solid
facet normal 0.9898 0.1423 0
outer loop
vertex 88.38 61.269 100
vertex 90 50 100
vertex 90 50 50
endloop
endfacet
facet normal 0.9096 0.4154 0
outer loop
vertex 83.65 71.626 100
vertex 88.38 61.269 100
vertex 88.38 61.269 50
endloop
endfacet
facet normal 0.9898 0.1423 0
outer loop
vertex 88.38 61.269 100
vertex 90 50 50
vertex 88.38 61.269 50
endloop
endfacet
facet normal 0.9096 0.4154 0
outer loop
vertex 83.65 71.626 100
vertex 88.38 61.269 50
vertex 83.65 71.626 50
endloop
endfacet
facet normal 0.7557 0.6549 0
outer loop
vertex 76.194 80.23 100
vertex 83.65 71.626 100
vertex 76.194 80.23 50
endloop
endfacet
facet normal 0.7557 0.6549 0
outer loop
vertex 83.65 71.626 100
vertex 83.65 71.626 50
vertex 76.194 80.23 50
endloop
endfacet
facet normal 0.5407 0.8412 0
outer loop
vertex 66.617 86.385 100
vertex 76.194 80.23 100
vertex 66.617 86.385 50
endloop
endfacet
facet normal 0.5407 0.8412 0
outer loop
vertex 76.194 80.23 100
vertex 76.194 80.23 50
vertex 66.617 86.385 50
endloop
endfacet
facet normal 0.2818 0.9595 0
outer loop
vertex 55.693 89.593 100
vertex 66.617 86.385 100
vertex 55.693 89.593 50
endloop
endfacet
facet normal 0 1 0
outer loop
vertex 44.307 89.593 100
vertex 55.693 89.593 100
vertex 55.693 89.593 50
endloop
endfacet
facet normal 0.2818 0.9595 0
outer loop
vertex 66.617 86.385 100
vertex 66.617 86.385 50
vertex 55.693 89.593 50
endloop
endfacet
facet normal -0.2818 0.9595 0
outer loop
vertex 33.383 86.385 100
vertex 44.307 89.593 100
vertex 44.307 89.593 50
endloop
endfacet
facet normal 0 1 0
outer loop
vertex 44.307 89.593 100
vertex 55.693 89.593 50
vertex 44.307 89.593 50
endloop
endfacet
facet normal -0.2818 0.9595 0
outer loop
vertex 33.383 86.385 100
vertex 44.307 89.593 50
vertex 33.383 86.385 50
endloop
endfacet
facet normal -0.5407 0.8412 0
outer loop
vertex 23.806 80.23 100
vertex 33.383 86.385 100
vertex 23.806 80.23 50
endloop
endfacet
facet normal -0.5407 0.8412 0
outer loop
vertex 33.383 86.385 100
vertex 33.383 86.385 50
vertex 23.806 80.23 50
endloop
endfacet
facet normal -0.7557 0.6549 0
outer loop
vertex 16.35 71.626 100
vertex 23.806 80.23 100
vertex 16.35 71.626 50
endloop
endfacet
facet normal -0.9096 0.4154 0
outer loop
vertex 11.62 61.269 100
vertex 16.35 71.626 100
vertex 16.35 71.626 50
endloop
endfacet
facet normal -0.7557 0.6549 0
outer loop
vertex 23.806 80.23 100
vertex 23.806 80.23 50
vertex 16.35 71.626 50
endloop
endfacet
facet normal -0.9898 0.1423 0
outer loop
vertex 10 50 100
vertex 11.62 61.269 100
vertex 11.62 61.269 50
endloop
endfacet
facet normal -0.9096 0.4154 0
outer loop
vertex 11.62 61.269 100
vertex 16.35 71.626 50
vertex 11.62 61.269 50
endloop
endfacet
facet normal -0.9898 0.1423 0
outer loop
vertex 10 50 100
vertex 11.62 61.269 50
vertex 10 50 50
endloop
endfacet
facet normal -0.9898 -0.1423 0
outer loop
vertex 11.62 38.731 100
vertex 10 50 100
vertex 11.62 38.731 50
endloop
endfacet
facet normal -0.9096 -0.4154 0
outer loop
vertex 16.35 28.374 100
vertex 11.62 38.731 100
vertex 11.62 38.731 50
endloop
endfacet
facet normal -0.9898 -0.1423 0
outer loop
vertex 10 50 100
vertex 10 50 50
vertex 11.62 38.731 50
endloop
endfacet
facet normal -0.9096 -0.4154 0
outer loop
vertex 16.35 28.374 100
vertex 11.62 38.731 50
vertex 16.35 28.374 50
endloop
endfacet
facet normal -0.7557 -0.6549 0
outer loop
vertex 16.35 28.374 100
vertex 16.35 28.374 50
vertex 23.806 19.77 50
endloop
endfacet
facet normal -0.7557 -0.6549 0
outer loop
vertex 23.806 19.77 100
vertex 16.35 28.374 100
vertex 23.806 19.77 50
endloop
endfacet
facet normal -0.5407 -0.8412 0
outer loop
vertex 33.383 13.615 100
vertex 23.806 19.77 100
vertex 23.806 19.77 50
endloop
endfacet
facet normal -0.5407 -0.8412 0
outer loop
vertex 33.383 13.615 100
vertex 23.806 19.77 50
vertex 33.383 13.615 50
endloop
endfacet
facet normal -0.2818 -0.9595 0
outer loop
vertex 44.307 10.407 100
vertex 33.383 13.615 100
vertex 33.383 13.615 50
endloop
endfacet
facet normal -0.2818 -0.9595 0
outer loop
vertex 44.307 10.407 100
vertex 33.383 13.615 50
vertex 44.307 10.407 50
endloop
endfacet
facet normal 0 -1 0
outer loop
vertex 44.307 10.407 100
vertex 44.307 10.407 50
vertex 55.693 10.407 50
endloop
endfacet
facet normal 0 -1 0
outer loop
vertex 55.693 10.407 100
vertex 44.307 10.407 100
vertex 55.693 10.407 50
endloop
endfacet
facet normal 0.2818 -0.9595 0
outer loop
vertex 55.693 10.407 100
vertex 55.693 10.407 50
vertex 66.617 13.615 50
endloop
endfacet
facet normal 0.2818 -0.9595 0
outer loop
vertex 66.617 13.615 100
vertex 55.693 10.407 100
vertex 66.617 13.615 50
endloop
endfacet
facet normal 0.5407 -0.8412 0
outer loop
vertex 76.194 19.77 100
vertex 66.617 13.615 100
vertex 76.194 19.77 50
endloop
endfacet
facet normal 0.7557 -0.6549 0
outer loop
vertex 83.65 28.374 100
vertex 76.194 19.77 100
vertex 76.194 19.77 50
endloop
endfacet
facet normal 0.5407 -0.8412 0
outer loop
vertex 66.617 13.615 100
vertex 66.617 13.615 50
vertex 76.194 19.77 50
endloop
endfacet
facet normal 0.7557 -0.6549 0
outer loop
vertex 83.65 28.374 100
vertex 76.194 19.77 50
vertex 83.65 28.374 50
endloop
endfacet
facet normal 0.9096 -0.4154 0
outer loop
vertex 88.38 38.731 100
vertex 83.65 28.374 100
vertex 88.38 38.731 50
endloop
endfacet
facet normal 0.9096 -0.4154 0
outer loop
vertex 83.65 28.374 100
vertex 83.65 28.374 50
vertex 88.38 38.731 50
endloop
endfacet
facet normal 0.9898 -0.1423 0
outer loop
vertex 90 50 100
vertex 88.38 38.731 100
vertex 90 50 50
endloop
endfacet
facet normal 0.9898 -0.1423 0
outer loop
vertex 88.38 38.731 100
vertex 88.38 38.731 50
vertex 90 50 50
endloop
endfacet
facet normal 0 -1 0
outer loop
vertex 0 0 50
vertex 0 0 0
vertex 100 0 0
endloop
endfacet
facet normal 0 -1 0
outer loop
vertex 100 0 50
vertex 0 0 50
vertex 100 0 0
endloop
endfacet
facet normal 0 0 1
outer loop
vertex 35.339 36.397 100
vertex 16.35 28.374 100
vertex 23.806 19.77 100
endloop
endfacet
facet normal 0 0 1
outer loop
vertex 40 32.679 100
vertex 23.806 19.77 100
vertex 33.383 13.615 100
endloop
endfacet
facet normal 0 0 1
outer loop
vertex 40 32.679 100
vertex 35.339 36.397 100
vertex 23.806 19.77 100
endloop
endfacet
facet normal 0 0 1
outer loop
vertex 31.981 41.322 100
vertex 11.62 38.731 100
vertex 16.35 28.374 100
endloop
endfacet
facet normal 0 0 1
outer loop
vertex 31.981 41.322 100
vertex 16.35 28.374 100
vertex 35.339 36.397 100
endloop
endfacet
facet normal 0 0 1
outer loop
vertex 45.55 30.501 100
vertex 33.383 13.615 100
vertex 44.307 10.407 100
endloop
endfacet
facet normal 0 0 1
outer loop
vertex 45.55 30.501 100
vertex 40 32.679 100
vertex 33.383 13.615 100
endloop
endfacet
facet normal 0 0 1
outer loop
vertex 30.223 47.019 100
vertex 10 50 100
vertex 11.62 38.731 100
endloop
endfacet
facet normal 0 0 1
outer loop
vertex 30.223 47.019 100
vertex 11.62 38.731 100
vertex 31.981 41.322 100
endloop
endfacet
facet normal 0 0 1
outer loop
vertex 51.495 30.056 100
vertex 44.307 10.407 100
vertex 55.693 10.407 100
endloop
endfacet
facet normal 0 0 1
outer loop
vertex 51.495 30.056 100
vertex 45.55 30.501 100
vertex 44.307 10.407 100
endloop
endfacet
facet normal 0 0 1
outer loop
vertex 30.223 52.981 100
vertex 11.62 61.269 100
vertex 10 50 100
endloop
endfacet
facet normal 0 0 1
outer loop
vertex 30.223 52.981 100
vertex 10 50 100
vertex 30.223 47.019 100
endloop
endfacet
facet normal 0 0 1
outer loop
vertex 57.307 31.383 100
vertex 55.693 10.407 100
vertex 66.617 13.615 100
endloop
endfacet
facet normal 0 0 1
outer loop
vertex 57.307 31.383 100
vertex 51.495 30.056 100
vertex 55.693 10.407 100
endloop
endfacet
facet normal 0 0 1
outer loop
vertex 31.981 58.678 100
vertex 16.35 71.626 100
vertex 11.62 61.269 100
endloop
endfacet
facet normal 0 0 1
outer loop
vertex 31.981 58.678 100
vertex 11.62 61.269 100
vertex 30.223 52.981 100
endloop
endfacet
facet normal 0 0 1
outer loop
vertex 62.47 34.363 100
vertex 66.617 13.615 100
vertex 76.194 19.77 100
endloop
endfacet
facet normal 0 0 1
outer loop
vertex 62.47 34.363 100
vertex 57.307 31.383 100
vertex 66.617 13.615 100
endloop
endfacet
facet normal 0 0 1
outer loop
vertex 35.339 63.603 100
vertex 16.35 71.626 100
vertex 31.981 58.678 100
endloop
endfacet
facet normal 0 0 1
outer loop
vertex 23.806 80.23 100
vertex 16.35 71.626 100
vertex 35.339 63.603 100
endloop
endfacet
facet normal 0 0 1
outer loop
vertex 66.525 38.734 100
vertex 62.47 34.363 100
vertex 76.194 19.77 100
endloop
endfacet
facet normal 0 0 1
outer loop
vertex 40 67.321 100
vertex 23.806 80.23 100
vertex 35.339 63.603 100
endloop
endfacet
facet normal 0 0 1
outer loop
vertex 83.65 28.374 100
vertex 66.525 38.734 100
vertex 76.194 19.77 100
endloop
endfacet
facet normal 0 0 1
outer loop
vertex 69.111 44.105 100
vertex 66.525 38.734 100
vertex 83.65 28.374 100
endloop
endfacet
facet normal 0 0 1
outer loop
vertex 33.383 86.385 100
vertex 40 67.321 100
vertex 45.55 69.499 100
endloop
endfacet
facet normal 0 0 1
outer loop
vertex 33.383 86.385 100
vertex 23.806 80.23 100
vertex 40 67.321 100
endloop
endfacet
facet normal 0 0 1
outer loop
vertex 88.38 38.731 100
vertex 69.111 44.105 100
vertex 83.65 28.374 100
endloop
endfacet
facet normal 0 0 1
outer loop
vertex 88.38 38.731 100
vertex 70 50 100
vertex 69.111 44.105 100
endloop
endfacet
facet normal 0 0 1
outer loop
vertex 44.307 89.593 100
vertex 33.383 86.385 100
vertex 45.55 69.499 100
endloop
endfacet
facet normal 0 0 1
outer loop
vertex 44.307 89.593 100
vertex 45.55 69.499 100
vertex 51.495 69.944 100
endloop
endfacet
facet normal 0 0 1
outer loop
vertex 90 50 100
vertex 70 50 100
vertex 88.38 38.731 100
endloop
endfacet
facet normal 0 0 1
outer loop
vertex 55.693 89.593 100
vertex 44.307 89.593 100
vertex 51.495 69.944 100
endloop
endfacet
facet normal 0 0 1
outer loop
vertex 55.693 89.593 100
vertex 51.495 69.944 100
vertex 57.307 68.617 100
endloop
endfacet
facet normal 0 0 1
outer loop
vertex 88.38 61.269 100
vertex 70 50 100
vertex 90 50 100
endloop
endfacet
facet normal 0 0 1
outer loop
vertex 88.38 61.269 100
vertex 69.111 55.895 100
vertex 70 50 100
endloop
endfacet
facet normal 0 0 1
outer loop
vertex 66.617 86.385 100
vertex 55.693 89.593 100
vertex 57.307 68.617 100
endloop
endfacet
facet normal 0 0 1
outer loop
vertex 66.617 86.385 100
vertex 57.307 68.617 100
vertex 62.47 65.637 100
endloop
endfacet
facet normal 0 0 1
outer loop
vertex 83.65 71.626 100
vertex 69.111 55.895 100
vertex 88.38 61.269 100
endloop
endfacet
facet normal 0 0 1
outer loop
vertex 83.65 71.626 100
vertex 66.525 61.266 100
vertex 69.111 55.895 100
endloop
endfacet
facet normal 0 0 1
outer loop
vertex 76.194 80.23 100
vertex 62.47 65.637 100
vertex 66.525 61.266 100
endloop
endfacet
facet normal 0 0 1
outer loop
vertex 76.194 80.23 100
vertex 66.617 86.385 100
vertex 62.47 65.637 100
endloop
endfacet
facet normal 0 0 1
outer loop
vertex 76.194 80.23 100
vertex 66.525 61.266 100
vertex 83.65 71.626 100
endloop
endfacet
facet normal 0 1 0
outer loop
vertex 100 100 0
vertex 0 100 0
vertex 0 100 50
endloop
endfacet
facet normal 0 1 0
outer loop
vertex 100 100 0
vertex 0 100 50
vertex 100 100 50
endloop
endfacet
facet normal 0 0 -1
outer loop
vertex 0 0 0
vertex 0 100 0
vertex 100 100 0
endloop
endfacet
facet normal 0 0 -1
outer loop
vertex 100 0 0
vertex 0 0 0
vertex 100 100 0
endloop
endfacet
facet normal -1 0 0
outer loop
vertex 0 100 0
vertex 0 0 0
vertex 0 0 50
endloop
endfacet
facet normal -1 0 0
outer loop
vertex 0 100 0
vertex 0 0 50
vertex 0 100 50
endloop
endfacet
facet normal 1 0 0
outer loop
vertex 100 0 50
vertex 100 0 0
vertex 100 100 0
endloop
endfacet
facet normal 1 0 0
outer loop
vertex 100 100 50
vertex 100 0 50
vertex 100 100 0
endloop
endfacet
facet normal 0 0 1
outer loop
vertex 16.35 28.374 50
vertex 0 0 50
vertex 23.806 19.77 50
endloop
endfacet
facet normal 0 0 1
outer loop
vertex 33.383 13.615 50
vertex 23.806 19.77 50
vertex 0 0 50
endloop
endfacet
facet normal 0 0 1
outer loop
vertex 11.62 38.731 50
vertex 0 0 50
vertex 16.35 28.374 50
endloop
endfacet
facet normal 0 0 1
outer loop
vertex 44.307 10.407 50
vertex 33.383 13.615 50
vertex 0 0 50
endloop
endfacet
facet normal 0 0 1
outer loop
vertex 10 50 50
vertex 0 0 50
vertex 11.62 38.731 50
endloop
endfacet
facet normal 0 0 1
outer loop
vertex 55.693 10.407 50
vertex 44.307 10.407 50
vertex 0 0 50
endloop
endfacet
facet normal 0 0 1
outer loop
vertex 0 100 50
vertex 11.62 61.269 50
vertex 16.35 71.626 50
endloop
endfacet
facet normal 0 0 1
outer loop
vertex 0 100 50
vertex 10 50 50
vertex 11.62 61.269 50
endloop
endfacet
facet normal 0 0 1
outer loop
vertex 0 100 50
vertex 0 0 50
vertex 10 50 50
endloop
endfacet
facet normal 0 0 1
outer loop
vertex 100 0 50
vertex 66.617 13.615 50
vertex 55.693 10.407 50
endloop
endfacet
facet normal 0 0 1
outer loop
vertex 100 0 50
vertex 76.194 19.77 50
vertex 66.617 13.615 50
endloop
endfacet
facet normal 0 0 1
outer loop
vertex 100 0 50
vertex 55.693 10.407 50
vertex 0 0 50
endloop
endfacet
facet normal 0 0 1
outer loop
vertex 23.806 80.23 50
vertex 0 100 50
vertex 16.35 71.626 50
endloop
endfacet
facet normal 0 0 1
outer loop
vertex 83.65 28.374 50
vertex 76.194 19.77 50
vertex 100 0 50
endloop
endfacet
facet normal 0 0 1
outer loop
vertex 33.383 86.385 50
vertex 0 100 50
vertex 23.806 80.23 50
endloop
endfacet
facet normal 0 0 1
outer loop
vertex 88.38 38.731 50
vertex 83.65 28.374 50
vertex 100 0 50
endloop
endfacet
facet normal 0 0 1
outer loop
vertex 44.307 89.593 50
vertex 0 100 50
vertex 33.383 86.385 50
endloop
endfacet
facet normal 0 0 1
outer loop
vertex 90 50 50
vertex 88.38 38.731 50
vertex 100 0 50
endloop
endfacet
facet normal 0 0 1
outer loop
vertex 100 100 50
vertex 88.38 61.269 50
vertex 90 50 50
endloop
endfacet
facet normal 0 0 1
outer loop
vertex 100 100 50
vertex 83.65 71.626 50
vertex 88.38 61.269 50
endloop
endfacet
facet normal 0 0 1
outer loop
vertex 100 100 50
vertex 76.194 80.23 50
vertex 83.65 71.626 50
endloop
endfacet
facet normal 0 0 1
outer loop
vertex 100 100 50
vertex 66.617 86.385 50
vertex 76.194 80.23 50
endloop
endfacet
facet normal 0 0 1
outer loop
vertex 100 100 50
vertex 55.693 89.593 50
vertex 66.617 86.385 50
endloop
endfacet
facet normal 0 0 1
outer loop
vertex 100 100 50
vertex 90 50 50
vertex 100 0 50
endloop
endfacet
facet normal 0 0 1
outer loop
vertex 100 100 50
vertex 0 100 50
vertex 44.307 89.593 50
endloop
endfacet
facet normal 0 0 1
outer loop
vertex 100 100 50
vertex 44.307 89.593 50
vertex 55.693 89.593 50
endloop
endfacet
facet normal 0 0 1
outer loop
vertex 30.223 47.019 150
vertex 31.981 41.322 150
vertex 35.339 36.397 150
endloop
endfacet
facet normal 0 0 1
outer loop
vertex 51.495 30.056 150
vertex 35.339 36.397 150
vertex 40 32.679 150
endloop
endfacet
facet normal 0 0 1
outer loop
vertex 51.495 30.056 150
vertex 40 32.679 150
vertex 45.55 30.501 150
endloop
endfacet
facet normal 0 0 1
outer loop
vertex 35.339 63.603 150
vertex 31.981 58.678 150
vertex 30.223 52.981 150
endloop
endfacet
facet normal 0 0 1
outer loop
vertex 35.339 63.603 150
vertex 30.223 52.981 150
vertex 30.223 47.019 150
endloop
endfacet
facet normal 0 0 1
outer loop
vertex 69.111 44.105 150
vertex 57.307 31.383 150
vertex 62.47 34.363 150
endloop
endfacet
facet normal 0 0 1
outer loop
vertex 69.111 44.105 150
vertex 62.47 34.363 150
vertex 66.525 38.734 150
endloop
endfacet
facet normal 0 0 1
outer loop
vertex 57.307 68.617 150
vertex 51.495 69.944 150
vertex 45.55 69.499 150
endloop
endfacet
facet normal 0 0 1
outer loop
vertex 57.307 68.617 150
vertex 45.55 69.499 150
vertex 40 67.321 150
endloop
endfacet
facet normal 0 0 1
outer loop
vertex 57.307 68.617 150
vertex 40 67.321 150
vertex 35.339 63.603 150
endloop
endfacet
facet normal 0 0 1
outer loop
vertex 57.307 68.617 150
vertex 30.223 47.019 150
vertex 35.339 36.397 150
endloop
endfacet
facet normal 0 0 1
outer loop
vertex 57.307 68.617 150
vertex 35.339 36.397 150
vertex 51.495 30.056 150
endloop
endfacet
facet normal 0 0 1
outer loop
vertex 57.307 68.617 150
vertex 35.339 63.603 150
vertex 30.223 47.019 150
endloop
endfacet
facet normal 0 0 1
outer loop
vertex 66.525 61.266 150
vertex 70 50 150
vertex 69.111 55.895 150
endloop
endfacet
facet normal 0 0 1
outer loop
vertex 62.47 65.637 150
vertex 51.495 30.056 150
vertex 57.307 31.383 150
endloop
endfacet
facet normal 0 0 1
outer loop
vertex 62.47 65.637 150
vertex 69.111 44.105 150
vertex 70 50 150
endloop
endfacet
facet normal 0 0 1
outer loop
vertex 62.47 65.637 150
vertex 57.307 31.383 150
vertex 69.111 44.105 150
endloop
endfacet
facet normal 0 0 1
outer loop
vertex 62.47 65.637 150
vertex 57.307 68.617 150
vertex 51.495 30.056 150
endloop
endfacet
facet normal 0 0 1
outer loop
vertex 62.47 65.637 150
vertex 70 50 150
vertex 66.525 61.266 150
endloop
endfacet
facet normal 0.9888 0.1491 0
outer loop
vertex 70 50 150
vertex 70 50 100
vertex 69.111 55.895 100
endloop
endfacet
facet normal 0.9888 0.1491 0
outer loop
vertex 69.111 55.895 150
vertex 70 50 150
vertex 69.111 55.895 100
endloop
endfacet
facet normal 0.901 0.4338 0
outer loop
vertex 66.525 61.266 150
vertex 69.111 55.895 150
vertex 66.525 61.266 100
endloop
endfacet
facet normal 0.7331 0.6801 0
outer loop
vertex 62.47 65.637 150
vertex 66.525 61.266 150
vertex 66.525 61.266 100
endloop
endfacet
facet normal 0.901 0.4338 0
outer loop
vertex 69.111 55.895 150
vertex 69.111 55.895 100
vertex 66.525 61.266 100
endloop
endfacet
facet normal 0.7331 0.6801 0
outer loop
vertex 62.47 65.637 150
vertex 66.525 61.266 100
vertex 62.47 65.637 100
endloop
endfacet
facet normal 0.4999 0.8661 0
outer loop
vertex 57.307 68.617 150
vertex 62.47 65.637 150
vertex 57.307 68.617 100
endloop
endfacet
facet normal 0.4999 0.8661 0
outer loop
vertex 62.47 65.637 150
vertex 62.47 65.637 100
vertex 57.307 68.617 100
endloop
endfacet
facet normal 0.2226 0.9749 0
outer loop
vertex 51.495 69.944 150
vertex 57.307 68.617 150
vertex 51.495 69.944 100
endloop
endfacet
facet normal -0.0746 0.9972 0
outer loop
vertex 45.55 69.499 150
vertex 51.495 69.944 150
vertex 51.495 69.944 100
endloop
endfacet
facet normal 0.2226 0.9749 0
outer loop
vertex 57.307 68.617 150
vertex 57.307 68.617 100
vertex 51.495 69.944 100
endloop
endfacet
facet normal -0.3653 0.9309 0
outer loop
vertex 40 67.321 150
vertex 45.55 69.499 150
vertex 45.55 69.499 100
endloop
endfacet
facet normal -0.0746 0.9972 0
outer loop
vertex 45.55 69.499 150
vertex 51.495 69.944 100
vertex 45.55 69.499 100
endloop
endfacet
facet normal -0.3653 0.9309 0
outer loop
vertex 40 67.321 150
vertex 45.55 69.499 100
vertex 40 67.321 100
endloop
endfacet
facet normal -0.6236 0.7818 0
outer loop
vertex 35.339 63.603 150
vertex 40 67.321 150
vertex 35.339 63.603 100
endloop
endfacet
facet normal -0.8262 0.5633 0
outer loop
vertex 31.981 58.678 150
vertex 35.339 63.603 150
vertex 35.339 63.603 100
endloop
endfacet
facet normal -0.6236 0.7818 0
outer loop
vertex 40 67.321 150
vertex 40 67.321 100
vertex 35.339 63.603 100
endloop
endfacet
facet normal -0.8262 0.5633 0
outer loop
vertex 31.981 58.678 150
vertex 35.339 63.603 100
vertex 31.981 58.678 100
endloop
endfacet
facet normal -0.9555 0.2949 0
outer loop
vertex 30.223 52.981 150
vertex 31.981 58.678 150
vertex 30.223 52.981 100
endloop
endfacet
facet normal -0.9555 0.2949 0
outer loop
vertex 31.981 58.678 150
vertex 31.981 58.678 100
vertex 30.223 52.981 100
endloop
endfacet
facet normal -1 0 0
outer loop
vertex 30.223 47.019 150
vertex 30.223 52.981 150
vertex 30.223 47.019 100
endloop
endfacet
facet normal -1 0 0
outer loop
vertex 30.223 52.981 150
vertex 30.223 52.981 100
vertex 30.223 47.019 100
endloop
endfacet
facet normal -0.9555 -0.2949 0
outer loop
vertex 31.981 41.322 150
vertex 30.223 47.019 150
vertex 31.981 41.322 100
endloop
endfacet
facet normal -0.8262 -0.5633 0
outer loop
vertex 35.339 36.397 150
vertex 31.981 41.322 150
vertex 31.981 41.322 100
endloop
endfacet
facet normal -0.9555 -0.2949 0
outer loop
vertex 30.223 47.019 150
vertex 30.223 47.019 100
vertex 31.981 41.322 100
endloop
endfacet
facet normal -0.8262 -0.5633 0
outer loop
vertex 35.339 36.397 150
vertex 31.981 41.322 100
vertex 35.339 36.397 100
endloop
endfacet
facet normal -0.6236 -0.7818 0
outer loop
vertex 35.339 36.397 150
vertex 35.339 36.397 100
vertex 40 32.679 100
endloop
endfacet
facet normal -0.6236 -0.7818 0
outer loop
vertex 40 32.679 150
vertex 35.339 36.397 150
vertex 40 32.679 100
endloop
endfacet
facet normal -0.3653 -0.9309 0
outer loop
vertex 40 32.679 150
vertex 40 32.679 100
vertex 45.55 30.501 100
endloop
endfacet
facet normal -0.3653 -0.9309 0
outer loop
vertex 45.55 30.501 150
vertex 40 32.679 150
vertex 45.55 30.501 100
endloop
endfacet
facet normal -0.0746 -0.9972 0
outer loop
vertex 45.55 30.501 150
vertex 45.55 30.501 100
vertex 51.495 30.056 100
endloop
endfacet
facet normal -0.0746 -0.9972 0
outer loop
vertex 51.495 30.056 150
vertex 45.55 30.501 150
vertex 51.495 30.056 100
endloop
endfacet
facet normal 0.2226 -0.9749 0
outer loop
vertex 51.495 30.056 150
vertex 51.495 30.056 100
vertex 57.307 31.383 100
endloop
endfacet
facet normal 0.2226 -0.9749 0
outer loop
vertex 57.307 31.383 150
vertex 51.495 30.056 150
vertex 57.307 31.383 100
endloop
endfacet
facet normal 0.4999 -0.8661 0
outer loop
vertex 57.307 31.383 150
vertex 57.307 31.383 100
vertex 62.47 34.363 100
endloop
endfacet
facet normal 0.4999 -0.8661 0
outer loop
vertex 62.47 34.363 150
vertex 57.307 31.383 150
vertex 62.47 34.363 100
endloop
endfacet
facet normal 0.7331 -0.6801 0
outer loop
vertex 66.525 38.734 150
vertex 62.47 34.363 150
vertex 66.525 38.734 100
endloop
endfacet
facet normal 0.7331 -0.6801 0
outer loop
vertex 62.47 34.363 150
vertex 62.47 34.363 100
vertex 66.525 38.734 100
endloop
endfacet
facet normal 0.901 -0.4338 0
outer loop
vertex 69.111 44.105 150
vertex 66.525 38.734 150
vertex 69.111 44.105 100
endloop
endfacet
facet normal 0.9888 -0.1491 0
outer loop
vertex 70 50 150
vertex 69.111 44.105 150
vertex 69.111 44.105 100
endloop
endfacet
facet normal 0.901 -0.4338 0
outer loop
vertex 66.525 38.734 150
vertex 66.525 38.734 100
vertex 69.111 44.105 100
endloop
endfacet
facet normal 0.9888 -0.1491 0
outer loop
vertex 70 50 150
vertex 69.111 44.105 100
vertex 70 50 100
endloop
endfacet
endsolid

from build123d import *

# Parameters (mm, degrees)
F0_W     = 100
F0_H     = 100
F1_DEPTH = 50
F2_R     = 40
F3_DEPTH = 50
F4_R     = 20
F5_DEPTH = 50


with BuildPart() as f1:
    # F0 (on Top) → F1 (new body)
    with BuildSketch(Plane.XY):
        with Locations((50, 50)):
            Rectangle(F0_W, F0_H)
    extrude(amount=F1_DEPTH)

    # F2 (on face) → F3 (join)
    with BuildSketch(Plane.XY.offset(50)):
        with Locations((50, 50)):
            Circle(F2_R)
    extrude(amount=F3_DEPTH)

    # F4 (on face) → F5 (join)
    with BuildSketch(Plane.XY.offset(100)):
        with Locations((50, 50)):
            Circle(F4_R)
    extrude(amount=F5_DEPTH)


solid = f1.part
